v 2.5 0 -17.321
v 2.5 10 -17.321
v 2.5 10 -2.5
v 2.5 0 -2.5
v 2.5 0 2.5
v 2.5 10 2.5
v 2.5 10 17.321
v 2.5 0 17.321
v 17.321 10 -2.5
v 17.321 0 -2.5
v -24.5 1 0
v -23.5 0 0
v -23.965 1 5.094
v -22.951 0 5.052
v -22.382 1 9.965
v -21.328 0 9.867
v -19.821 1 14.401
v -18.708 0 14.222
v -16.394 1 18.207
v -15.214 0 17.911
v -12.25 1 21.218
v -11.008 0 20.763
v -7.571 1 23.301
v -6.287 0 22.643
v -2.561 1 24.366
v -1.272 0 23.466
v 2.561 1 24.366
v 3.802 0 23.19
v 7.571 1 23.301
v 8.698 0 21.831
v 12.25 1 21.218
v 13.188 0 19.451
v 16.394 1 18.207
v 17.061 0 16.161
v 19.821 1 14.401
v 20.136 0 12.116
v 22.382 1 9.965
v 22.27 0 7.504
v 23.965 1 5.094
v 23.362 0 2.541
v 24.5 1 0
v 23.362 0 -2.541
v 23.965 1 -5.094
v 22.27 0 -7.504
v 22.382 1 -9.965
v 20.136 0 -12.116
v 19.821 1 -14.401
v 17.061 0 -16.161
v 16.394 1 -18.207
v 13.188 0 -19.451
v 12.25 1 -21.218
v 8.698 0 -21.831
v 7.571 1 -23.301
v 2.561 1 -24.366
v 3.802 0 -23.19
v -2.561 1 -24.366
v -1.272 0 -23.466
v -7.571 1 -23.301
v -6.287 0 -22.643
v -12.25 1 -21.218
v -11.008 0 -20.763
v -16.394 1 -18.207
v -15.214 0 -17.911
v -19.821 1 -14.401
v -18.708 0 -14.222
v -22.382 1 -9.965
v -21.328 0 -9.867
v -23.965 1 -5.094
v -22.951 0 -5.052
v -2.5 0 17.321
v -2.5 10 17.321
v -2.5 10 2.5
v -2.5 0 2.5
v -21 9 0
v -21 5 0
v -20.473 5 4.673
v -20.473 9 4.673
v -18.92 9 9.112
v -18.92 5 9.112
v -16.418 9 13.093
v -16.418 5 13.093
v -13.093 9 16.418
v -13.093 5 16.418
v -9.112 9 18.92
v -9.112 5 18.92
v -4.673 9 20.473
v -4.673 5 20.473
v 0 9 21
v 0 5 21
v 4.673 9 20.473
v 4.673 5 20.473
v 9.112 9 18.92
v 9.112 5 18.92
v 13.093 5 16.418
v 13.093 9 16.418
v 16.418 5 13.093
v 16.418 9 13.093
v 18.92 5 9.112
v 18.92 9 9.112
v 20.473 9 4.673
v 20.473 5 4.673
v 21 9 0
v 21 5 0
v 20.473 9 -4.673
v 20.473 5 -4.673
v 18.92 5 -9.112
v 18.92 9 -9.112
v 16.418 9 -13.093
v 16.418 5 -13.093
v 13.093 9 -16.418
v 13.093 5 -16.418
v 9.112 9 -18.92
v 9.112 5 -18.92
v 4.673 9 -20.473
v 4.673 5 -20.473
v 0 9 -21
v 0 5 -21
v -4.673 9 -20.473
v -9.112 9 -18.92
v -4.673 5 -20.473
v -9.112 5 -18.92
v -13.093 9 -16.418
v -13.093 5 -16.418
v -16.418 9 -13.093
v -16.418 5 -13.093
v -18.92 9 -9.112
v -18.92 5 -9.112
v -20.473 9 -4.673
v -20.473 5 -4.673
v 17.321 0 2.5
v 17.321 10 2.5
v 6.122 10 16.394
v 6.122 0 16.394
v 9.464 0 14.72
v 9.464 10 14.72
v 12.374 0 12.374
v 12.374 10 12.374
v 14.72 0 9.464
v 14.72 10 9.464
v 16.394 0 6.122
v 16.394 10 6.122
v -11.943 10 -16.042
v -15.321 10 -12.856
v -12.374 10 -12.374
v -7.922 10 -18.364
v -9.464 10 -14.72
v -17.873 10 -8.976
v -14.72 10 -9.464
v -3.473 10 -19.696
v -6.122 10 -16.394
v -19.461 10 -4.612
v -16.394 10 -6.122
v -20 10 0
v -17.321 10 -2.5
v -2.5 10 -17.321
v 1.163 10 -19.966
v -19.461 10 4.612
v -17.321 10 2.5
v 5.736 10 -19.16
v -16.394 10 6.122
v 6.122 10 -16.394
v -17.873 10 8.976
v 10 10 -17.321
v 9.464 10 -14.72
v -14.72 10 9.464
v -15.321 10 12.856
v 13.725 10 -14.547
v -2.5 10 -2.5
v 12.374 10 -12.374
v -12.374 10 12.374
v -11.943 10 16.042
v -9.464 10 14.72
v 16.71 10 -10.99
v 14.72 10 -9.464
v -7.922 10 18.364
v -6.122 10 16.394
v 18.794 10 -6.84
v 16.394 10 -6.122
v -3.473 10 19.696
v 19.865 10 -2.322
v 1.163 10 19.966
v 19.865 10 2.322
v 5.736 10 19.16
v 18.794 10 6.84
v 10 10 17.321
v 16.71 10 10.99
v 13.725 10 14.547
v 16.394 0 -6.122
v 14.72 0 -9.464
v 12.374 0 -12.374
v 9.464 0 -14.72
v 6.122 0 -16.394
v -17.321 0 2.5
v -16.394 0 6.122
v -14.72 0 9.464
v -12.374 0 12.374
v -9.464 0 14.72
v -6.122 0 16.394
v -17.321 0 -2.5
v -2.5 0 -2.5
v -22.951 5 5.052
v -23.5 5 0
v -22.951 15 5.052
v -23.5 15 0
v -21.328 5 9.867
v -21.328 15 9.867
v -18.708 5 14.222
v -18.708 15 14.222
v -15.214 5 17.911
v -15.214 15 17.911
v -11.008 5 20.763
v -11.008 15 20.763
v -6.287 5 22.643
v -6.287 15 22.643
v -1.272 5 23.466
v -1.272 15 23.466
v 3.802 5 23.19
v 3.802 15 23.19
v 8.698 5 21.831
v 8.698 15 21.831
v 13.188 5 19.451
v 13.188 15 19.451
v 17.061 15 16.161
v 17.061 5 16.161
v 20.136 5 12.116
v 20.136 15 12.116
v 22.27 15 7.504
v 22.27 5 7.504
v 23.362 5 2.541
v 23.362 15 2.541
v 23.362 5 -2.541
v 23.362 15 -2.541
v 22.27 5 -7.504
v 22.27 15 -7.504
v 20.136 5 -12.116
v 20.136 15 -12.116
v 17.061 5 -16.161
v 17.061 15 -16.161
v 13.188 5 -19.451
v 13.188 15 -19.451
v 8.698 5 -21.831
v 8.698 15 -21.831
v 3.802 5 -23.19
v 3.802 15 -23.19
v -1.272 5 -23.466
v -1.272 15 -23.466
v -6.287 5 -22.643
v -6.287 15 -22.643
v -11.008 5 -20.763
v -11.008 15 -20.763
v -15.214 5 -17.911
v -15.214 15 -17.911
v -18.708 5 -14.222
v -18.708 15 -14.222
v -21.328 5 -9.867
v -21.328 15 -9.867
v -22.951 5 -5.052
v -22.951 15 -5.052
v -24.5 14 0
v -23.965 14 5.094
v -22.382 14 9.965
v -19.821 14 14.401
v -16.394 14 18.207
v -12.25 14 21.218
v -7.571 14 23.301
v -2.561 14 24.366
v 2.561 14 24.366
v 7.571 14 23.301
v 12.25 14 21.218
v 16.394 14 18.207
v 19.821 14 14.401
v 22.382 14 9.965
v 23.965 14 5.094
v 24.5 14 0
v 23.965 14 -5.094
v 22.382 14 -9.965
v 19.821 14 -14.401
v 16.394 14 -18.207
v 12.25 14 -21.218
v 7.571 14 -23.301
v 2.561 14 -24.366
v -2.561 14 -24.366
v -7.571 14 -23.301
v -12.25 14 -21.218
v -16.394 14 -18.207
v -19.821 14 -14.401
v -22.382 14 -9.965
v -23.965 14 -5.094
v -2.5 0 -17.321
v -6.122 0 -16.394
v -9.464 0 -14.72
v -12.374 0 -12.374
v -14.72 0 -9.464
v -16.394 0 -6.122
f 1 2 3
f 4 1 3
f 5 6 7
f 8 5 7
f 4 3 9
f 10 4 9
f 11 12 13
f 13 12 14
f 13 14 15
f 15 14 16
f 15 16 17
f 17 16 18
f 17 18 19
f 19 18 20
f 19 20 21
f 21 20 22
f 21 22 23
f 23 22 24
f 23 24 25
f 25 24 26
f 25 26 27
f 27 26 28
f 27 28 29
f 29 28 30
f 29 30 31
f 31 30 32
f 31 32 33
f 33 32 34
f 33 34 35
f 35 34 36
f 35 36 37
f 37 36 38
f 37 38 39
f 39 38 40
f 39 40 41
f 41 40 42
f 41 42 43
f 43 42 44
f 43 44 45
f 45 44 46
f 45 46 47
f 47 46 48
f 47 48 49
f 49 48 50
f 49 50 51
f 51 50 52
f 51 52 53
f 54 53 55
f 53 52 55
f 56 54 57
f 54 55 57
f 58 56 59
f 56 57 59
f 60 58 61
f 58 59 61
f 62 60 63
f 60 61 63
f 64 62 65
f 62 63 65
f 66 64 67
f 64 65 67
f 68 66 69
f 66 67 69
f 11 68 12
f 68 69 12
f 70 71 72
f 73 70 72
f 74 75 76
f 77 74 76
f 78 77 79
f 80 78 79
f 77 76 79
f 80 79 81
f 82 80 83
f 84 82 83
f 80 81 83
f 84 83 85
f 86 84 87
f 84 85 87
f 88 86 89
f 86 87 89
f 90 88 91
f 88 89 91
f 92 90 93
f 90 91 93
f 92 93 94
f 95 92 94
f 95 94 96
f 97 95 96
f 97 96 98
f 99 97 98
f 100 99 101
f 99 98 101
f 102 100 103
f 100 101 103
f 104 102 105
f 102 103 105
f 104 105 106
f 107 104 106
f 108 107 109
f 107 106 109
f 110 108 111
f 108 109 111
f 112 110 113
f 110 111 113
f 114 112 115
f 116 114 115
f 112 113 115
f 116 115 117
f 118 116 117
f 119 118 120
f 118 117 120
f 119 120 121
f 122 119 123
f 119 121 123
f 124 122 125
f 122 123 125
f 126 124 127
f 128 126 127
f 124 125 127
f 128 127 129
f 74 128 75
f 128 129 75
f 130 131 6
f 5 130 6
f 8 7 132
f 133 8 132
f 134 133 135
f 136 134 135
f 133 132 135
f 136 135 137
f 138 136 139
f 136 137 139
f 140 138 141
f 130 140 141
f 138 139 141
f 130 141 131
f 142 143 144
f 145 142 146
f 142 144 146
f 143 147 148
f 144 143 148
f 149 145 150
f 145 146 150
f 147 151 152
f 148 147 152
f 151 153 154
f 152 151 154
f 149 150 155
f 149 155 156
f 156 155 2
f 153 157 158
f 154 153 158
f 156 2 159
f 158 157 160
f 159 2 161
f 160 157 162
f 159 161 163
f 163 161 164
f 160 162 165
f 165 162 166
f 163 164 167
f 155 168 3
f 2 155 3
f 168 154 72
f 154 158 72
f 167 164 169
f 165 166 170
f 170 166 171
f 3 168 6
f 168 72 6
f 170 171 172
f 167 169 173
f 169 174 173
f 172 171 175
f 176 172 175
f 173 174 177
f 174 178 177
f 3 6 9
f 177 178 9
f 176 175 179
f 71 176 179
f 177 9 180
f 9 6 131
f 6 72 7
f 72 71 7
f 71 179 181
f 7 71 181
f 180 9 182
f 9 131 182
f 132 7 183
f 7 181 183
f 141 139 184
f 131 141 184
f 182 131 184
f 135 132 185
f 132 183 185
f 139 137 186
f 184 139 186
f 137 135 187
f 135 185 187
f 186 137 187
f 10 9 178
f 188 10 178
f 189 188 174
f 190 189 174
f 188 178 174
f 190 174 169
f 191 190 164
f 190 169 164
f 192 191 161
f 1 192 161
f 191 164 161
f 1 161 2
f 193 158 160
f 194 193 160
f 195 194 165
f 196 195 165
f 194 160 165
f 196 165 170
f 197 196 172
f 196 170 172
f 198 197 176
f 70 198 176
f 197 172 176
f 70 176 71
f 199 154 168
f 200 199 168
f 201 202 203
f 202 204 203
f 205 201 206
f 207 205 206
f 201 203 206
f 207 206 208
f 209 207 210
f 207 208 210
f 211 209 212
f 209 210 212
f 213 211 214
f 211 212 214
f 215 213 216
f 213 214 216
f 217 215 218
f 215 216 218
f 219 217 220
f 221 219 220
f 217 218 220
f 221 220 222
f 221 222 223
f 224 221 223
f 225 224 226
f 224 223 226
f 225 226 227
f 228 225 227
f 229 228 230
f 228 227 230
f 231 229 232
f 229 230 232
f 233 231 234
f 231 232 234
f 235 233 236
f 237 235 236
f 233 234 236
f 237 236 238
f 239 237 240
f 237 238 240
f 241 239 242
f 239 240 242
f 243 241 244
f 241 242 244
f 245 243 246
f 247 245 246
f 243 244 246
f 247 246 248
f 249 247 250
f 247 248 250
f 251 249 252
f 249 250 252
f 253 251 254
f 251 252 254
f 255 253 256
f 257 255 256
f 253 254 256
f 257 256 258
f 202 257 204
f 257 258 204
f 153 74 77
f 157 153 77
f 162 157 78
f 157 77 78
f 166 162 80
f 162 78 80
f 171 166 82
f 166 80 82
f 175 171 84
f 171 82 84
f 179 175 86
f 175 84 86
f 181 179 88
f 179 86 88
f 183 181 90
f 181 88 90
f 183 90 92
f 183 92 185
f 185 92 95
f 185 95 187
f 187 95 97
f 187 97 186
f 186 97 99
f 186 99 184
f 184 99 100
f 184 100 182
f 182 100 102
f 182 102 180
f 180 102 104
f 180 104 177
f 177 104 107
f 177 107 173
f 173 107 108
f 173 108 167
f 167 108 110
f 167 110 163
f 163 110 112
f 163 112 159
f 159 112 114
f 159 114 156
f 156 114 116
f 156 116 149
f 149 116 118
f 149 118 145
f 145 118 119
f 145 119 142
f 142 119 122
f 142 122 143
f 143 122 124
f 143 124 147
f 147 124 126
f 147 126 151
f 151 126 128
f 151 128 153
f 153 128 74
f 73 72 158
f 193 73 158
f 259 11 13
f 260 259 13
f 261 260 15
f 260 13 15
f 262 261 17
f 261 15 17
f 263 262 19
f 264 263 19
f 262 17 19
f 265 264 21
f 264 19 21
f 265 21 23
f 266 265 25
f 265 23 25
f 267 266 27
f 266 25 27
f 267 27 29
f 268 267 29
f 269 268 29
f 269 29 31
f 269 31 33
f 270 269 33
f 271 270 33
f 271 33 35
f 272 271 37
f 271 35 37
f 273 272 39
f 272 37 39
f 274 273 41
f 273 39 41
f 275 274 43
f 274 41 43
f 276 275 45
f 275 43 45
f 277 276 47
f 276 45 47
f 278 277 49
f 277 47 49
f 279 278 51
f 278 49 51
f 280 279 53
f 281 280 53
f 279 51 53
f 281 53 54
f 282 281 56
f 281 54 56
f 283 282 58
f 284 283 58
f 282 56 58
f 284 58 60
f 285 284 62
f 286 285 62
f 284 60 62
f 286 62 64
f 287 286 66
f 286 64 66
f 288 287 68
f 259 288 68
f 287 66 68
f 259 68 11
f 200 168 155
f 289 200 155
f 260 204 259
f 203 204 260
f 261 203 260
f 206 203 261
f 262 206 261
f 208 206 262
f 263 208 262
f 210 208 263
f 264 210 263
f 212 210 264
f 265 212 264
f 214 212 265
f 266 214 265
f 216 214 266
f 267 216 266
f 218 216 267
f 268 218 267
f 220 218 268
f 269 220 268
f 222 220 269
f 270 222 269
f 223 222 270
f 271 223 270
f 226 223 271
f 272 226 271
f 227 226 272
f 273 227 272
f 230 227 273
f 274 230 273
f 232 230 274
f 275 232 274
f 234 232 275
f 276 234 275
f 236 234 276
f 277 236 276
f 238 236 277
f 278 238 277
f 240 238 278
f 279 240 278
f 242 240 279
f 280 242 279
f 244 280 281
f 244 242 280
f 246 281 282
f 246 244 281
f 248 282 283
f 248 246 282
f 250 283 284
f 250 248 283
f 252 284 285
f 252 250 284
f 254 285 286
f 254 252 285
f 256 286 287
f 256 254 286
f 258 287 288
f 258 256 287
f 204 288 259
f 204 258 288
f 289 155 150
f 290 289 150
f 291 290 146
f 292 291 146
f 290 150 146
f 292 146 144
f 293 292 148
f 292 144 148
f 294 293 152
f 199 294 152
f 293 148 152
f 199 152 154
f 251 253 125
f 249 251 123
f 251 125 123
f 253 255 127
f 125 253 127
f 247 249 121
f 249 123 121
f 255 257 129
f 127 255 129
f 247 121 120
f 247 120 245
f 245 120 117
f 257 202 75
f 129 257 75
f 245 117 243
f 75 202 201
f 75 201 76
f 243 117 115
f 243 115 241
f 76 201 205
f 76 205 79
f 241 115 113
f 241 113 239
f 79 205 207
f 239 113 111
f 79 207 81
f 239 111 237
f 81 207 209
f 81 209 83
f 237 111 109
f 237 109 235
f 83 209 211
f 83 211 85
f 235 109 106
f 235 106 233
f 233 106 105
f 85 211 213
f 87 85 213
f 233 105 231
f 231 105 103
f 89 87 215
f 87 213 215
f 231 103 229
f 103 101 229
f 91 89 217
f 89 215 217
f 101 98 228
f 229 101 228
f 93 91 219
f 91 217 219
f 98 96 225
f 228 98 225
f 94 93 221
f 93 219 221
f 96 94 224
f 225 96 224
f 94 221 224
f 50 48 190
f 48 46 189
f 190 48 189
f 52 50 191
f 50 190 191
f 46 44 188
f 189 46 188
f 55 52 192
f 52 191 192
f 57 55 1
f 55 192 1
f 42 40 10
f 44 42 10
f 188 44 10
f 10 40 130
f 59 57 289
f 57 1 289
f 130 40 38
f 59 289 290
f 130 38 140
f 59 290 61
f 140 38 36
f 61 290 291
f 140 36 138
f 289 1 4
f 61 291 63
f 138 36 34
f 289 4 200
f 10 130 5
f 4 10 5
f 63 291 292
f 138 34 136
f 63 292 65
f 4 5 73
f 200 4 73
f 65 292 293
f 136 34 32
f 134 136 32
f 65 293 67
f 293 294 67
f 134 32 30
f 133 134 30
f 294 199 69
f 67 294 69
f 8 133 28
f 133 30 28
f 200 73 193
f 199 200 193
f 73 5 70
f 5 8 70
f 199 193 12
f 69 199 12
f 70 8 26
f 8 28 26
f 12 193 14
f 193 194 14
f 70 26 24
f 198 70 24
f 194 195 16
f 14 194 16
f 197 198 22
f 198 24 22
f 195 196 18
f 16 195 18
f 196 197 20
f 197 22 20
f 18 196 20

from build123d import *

# Parameters (mm, degrees)
F3_DEPTH = 25
F4_SIZE  = 0.99999


# Not quite as in the source:
# - a fillet or chamfer is up to 0.001 mm smaller than in the source, because OpenCascade refuses the exact size


with BuildPart() as f1:
    # F0 (on Top) → F1 (revolve)
    with BuildSketch(Plane.XY):
        Polygon((-24.5, 15), (-24.5, 0), (0, 0), (0, 10), (-21, 10), (-21, 5), (-23.5, 5), (-23.5, 15), align=None)
    revolve(axis=Axis((0, 1.7348257825, 0), (0, 1, 0)))

    # F2 (on face) → F3 (cut)
    with BuildSketch(Plane(origin=(0, 10, 0), x_dir=(-1, 0, 0), z_dir=(0, 1, 0))):
        with BuildLine():
            Line((-2.5, -2.5), (-17.3205080757, -2.5))
            ThreePointArc((-17.3205080757, -2.5), (-12.3743686708, -12.3743686708), (-2.5, -17.3205080757))
            Line((-2.5, -17.3205080757), (-2.5, -2.5))
        make_face()
        with BuildLine():
            ThreePointArc((17.3205080757, 2.5), (12.3743686708, 12.3743686708), (2.5, 17.3205080757))
            Line((2.5, 17.3205080757), (2.5, 2.5))
            Line((2.5, 2.5), (17.3205080757, 2.5))
        make_face()
        with BuildLine():
            Line((-2.5, 2.5), (-2.5, 17.3205080757))
            ThreePointArc((-2.5, 17.3205080757), (-12.3743686708, 12.3743686708), (-17.3205080757, 2.5))
            Line((-17.3205080757, 2.5), (-2.5, 2.5))
        make_face()
        with BuildLine():
            Line((17.3205080757, -2.5), (2.5, -2.5))
            Line((2.5, -2.5), (2.5, -17.3205080757))
            ThreePointArc((2.5, -17.3205080757), (12.3743686708, -12.3743686708), (17.3205080757, -2.5))
        make_face()
    extrude(amount=-F3_DEPTH, mode=Mode.SUBTRACT)

    # F4 (size 1 in the source; OpenCascade refuses exactly that, so slightly less here)
    f4_edges = [f1.edges().sort_by_distance(p)[0] for p in [
        (24.5, 0, 0),
        (24.5, 15, 0),
        (21, 10, 0),
    ]]
    chamfer(f4_edges, length=F4_SIZE)


solid = f1.part
